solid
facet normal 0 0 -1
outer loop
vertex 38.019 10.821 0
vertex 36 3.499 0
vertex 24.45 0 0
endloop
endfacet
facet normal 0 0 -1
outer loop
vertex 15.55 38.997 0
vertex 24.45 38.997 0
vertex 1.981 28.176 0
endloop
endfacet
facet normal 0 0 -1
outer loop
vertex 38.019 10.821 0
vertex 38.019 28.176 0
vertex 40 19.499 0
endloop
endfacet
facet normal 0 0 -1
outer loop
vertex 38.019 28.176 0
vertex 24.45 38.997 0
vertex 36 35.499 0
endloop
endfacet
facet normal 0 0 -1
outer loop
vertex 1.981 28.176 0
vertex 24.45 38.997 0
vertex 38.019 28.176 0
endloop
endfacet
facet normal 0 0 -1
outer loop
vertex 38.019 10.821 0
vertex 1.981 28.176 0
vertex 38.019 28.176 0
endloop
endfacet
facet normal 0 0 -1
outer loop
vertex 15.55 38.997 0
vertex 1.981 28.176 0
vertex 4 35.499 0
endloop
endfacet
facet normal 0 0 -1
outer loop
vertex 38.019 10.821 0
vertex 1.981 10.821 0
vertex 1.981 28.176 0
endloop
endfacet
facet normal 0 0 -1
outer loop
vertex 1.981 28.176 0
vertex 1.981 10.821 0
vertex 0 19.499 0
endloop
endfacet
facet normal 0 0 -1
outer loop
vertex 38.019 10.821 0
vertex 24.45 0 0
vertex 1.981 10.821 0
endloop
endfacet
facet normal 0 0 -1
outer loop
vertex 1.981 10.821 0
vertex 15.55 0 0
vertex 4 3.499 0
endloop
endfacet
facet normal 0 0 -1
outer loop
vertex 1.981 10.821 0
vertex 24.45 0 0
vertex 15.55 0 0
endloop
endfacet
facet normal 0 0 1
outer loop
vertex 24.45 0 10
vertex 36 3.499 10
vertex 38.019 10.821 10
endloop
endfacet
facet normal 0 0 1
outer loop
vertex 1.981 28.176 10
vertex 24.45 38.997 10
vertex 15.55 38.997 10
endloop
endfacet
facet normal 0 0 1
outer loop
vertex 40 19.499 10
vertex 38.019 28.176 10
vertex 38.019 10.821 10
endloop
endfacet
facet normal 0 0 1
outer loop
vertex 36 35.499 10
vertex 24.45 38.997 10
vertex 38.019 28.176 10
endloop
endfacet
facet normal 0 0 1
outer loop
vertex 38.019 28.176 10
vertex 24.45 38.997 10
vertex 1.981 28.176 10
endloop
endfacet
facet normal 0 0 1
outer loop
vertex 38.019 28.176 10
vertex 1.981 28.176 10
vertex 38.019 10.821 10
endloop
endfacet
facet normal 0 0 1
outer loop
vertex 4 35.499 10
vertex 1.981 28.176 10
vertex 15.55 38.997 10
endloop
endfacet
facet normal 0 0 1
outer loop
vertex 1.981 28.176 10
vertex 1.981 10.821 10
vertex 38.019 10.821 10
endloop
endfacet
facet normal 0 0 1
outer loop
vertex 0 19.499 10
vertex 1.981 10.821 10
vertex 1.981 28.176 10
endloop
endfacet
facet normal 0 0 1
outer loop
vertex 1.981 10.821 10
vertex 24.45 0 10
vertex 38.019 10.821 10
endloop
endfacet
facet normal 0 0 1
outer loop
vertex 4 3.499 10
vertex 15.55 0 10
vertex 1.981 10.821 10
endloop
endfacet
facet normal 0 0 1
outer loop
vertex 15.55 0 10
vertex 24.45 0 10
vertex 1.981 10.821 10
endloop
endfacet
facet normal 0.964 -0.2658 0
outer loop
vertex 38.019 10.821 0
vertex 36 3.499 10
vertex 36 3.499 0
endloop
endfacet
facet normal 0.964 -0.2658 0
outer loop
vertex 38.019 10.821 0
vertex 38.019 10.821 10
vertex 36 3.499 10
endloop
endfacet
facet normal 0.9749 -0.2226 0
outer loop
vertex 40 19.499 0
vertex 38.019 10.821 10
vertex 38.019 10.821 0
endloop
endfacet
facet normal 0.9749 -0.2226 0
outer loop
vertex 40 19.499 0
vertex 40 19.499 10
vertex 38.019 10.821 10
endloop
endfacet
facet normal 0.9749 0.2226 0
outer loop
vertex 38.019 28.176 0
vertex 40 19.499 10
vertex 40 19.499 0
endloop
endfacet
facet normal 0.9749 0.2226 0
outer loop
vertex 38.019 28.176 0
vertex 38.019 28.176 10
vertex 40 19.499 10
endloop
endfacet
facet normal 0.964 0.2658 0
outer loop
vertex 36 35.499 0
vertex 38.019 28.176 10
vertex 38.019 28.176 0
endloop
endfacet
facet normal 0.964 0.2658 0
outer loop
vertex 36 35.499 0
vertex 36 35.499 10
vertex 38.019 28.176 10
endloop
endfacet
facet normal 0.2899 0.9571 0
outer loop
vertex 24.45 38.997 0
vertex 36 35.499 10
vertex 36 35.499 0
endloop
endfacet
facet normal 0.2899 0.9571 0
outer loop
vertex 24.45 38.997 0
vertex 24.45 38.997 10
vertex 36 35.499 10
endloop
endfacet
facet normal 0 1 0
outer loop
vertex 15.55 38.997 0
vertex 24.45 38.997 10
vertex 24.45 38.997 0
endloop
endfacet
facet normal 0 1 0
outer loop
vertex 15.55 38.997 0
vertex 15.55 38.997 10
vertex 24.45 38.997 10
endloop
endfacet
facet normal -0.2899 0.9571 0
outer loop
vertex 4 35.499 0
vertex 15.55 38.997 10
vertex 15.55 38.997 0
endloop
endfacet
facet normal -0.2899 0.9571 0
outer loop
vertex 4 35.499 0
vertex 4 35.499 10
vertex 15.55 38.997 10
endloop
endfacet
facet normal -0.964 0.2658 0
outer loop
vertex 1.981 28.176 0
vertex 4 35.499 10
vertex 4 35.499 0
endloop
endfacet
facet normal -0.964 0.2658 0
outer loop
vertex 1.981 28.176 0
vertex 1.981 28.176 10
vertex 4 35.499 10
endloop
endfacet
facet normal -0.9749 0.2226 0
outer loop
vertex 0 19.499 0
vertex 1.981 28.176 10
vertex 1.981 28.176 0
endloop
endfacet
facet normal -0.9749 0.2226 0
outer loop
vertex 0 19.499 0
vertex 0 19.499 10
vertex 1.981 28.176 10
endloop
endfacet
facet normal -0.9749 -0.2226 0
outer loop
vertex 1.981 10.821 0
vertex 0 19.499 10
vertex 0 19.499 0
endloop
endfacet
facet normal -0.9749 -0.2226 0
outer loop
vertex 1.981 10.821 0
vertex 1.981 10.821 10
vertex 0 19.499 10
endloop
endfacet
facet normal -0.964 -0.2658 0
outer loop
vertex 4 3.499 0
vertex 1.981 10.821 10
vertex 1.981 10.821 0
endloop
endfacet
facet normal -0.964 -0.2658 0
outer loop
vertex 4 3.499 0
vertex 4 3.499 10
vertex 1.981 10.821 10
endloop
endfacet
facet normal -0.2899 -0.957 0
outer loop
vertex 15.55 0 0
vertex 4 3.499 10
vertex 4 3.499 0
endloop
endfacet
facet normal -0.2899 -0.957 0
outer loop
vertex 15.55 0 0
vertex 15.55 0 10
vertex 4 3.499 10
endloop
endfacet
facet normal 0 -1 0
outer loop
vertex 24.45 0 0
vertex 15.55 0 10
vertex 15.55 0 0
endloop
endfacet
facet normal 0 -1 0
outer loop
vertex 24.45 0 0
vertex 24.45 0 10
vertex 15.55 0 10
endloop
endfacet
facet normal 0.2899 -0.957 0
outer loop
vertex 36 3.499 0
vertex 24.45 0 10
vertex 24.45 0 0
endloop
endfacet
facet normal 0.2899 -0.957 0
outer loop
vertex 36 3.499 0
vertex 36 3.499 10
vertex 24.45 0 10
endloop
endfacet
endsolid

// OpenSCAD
$fn = 32;

// ----------------------------------------------------------------------
// Flat adaptor: hex_disc, 10 mm thick
// ----------------------------------------------------------------------

// --- parameters (mm) ---
profile_height = 10;      // extrusion height
profile_points = 14;      // points of the closed outline

profile = [[0, 19.499], [1.981, 10.821], [4, 3.499], [15.55, 0], [24.45, 0], [36, 3.499], [38.019, 10.821], [40, 19.499], [38.019, 28.176], [36, 35.499], [24.45, 38.997], [15.55, 38.997], [4, 35.499], [1.981, 28.176]];  // single closed polygon, 14 points, counter clockwise

// --- the one profile operation ---
linear_extrude(height = profile_height) polygon(points = profile);
